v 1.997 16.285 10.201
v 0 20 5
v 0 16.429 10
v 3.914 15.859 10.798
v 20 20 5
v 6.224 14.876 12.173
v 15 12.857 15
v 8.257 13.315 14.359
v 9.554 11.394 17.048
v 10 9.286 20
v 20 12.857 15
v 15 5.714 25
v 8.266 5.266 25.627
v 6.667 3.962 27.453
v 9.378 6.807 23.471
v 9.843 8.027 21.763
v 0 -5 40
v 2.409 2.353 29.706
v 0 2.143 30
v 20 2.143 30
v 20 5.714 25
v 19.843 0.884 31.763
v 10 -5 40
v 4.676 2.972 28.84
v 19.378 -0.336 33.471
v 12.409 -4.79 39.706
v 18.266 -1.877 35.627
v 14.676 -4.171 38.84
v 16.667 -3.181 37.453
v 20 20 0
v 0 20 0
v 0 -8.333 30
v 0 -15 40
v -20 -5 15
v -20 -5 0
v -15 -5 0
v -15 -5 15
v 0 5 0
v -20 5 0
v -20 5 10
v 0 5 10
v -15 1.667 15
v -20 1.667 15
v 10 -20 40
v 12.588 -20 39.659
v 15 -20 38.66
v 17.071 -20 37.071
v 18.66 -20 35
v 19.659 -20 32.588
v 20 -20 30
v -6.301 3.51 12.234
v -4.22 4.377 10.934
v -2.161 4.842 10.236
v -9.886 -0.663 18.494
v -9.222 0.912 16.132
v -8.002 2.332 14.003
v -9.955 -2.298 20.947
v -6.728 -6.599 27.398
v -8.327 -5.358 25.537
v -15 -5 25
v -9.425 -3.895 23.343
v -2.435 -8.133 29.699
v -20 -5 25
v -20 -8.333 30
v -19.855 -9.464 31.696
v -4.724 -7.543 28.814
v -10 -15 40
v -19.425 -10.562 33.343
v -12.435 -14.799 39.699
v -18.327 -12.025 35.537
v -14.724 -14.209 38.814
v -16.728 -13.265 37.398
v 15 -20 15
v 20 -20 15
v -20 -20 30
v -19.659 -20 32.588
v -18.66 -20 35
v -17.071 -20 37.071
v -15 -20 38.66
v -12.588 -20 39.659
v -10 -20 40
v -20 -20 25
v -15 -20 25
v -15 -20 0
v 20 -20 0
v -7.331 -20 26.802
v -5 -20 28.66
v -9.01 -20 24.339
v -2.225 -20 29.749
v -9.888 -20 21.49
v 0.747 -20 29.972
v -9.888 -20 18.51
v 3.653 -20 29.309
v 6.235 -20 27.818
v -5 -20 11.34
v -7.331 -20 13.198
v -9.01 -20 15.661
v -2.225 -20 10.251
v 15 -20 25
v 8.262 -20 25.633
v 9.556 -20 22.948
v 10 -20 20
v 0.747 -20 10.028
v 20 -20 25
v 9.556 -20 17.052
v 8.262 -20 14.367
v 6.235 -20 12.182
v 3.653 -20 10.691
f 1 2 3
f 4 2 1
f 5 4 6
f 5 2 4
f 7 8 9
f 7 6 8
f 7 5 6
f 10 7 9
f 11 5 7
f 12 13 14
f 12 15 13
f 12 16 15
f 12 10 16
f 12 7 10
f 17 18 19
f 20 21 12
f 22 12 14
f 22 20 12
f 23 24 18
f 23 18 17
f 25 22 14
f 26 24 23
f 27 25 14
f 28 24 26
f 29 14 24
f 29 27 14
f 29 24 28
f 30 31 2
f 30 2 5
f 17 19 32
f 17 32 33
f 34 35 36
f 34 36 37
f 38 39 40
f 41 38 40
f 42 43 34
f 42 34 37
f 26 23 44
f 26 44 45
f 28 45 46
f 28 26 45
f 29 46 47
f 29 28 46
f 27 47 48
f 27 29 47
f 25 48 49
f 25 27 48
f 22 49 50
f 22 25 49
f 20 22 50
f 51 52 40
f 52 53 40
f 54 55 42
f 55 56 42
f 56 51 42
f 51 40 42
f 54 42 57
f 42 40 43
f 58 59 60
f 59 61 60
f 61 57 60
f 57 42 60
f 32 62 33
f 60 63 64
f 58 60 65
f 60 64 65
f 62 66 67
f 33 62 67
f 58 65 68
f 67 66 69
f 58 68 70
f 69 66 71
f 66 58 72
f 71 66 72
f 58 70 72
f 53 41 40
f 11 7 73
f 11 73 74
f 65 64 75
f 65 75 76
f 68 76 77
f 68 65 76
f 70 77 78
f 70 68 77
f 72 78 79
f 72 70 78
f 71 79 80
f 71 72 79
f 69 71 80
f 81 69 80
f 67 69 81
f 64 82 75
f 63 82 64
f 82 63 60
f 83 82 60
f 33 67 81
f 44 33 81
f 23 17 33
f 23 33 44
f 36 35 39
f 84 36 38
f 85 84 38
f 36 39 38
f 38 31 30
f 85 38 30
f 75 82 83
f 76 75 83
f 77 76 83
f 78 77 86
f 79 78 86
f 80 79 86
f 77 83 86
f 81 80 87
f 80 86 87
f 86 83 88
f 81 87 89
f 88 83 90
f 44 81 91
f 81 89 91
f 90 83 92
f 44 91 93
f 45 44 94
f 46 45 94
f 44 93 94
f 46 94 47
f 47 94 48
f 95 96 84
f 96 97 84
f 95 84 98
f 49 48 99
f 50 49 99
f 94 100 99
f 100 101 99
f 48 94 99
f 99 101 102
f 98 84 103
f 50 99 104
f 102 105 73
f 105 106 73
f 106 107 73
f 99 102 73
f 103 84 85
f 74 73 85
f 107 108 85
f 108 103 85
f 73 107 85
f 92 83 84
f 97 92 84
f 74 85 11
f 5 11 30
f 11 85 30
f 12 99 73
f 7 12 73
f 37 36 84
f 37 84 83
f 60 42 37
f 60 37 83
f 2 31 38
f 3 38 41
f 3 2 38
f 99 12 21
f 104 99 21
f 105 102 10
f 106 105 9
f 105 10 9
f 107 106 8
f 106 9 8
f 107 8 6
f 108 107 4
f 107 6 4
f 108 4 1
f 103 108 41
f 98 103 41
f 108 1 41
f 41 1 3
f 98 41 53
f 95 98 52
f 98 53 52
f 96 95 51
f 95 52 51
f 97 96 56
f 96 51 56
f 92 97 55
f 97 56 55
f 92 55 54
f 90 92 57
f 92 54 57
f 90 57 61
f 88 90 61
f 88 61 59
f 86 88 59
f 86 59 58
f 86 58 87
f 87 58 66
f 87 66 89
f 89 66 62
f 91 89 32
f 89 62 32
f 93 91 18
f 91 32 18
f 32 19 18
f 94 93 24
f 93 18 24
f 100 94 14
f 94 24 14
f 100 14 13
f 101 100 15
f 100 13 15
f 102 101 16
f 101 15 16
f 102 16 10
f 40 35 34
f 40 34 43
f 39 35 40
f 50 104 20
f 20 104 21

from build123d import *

# Parameters (mm, degrees)
SKETCH1_W           = 40
SKETCH1_H           = 40
BOSS_EXTRUDE1_DEPTH = 40
SKETCH2_R           = 10
CUT_EXTRUDE1_DEPTH  = 41
SKETCH3_W           = 5
SKETCH3_H           = 10
CUT_EXTRUDE2_DEPTH  = 41
CUT_EXTRUDE5_DEPTH  = 41
CUT_EXTRUDE6_DEPTH  = 41
SKETCH8_W           = 15
SKETCH8_H           = 15
CUT_EXTRUDE7_DEPTH  = 5
SKETCH9_W           = 15
SKETCH9_H           = 15
CUT_EXTRUDE8_DEPTH  = 20
CUT_EXTRUDE9_DEPTH  = 20
CUT_EXTRUDE10_DEPTH = 20


with BuildPart() as part:
    # Sketch1 → Boss-Extrude1 (new body)
    with BuildSketch(Plane.XY):
        Rectangle(SKETCH1_W, SKETCH1_H)
    extrude(amount=BOSS_EXTRUDE1_DEPTH)

    # Sketch2 → Cut-Extrude1 (cut, through all)
    with BuildSketch(Plane(origin=(0, 20, 0), x_dir=(1, 0, 0), z_dir=(0, 1, 0))):
        with Locations((0, -20)):
            Circle(SKETCH2_R)
    extrude(amount=-CUT_EXTRUDE1_DEPTH, mode=Mode.SUBTRACT)

    # Sketch3 → Cut-Extrude2 (cut, through all)
    with BuildSketch(Plane(origin=(0, 20, 0), x_dir=(1, 0, 0), z_dir=(0, 1, 0))):
        with Locations((17.5, -20)):
            Rectangle(SKETCH3_W, SKETCH3_H)
        with Locations((-17.5, -20)):
            Rectangle(SKETCH3_W, SKETCH3_H)
    extrude(amount=-CUT_EXTRUDE2_DEPTH, mode=Mode.SUBTRACT)

    # Sketch5 → Cut-Extrude5 (cut, through all)
    with BuildSketch(Plane(origin=(0, 20, 0), x_dir=(1, 0, 0), z_dir=(0, 1, 0))):
        with BuildLine():
            Line((-10, -40), (-20, -40))
            Line((-20, -40), (-20, -30))
            ThreePointArc((-20, -30), (-17.071067812, -37.071067812), (-10, -40))
        make_face()
    extrude(amount=-CUT_EXTRUDE5_DEPTH, mode=Mode.SUBTRACT)

    # Sketch7 → Cut-Extrude6 (cut, through all)
    with BuildSketch(Plane(origin=(0, 20, 0), x_dir=(1, 0, 0), z_dir=(0, 1, 0))):
        with BuildLine():
            Line((20, -30), (20, -40))
            Line((20, -40), (10, -40))
            ThreePointArc((10, -40), (17.071067812, -37.071067812), (20, -30))
        make_face()
    extrude(amount=-CUT_EXTRUDE6_DEPTH, mode=Mode.SUBTRACT)

    # Sketch8 → Cut-Extrude7 (cut)
    with BuildSketch(Plane.ZY.offset(20)):
        with Locations((7.5, -12.5)):
            Rectangle(SKETCH8_W, SKETCH8_H)
    extrude(amount=-CUT_EXTRUDE7_DEPTH, mode=Mode.SUBTRACT)

    # Sketch9 → Cut-Extrude8 (cut)
    with BuildSketch(Plane.ZY.offset(20)):
        with Locations((7.5, 12.5)):
            Rectangle(SKETCH9_W, SKETCH9_H)
    extrude(amount=-CUT_EXTRUDE8_DEPTH, mode=Mode.SUBTRACT)

    # Sketch10 → Cut-Extrude9 (cut)
    with BuildSketch(Plane(origin=(-20, 0, 0), x_dir=(0, 0, -1), z_dir=(1, 0, 0))):
        Polygon((-10, 5), (-40, -15), (-40, 20), (-10, 20), align=None)
    extrude(amount=CUT_EXTRUDE9_DEPTH, mode=Mode.SUBTRACT)

    # Sketch11 → Cut-Extrude10 (cut)
    with BuildSketch(Plane(origin=(20, 0, 0), x_dir=(0, 0, -1), z_dir=(1, 0, 0))):
        Polygon((-5, 20), (-40, -5), (-40, 20), align=None)
    extrude(amount=-CUT_EXTRUDE10_DEPTH, mode=Mode.SUBTRACT)


solid = part.part
